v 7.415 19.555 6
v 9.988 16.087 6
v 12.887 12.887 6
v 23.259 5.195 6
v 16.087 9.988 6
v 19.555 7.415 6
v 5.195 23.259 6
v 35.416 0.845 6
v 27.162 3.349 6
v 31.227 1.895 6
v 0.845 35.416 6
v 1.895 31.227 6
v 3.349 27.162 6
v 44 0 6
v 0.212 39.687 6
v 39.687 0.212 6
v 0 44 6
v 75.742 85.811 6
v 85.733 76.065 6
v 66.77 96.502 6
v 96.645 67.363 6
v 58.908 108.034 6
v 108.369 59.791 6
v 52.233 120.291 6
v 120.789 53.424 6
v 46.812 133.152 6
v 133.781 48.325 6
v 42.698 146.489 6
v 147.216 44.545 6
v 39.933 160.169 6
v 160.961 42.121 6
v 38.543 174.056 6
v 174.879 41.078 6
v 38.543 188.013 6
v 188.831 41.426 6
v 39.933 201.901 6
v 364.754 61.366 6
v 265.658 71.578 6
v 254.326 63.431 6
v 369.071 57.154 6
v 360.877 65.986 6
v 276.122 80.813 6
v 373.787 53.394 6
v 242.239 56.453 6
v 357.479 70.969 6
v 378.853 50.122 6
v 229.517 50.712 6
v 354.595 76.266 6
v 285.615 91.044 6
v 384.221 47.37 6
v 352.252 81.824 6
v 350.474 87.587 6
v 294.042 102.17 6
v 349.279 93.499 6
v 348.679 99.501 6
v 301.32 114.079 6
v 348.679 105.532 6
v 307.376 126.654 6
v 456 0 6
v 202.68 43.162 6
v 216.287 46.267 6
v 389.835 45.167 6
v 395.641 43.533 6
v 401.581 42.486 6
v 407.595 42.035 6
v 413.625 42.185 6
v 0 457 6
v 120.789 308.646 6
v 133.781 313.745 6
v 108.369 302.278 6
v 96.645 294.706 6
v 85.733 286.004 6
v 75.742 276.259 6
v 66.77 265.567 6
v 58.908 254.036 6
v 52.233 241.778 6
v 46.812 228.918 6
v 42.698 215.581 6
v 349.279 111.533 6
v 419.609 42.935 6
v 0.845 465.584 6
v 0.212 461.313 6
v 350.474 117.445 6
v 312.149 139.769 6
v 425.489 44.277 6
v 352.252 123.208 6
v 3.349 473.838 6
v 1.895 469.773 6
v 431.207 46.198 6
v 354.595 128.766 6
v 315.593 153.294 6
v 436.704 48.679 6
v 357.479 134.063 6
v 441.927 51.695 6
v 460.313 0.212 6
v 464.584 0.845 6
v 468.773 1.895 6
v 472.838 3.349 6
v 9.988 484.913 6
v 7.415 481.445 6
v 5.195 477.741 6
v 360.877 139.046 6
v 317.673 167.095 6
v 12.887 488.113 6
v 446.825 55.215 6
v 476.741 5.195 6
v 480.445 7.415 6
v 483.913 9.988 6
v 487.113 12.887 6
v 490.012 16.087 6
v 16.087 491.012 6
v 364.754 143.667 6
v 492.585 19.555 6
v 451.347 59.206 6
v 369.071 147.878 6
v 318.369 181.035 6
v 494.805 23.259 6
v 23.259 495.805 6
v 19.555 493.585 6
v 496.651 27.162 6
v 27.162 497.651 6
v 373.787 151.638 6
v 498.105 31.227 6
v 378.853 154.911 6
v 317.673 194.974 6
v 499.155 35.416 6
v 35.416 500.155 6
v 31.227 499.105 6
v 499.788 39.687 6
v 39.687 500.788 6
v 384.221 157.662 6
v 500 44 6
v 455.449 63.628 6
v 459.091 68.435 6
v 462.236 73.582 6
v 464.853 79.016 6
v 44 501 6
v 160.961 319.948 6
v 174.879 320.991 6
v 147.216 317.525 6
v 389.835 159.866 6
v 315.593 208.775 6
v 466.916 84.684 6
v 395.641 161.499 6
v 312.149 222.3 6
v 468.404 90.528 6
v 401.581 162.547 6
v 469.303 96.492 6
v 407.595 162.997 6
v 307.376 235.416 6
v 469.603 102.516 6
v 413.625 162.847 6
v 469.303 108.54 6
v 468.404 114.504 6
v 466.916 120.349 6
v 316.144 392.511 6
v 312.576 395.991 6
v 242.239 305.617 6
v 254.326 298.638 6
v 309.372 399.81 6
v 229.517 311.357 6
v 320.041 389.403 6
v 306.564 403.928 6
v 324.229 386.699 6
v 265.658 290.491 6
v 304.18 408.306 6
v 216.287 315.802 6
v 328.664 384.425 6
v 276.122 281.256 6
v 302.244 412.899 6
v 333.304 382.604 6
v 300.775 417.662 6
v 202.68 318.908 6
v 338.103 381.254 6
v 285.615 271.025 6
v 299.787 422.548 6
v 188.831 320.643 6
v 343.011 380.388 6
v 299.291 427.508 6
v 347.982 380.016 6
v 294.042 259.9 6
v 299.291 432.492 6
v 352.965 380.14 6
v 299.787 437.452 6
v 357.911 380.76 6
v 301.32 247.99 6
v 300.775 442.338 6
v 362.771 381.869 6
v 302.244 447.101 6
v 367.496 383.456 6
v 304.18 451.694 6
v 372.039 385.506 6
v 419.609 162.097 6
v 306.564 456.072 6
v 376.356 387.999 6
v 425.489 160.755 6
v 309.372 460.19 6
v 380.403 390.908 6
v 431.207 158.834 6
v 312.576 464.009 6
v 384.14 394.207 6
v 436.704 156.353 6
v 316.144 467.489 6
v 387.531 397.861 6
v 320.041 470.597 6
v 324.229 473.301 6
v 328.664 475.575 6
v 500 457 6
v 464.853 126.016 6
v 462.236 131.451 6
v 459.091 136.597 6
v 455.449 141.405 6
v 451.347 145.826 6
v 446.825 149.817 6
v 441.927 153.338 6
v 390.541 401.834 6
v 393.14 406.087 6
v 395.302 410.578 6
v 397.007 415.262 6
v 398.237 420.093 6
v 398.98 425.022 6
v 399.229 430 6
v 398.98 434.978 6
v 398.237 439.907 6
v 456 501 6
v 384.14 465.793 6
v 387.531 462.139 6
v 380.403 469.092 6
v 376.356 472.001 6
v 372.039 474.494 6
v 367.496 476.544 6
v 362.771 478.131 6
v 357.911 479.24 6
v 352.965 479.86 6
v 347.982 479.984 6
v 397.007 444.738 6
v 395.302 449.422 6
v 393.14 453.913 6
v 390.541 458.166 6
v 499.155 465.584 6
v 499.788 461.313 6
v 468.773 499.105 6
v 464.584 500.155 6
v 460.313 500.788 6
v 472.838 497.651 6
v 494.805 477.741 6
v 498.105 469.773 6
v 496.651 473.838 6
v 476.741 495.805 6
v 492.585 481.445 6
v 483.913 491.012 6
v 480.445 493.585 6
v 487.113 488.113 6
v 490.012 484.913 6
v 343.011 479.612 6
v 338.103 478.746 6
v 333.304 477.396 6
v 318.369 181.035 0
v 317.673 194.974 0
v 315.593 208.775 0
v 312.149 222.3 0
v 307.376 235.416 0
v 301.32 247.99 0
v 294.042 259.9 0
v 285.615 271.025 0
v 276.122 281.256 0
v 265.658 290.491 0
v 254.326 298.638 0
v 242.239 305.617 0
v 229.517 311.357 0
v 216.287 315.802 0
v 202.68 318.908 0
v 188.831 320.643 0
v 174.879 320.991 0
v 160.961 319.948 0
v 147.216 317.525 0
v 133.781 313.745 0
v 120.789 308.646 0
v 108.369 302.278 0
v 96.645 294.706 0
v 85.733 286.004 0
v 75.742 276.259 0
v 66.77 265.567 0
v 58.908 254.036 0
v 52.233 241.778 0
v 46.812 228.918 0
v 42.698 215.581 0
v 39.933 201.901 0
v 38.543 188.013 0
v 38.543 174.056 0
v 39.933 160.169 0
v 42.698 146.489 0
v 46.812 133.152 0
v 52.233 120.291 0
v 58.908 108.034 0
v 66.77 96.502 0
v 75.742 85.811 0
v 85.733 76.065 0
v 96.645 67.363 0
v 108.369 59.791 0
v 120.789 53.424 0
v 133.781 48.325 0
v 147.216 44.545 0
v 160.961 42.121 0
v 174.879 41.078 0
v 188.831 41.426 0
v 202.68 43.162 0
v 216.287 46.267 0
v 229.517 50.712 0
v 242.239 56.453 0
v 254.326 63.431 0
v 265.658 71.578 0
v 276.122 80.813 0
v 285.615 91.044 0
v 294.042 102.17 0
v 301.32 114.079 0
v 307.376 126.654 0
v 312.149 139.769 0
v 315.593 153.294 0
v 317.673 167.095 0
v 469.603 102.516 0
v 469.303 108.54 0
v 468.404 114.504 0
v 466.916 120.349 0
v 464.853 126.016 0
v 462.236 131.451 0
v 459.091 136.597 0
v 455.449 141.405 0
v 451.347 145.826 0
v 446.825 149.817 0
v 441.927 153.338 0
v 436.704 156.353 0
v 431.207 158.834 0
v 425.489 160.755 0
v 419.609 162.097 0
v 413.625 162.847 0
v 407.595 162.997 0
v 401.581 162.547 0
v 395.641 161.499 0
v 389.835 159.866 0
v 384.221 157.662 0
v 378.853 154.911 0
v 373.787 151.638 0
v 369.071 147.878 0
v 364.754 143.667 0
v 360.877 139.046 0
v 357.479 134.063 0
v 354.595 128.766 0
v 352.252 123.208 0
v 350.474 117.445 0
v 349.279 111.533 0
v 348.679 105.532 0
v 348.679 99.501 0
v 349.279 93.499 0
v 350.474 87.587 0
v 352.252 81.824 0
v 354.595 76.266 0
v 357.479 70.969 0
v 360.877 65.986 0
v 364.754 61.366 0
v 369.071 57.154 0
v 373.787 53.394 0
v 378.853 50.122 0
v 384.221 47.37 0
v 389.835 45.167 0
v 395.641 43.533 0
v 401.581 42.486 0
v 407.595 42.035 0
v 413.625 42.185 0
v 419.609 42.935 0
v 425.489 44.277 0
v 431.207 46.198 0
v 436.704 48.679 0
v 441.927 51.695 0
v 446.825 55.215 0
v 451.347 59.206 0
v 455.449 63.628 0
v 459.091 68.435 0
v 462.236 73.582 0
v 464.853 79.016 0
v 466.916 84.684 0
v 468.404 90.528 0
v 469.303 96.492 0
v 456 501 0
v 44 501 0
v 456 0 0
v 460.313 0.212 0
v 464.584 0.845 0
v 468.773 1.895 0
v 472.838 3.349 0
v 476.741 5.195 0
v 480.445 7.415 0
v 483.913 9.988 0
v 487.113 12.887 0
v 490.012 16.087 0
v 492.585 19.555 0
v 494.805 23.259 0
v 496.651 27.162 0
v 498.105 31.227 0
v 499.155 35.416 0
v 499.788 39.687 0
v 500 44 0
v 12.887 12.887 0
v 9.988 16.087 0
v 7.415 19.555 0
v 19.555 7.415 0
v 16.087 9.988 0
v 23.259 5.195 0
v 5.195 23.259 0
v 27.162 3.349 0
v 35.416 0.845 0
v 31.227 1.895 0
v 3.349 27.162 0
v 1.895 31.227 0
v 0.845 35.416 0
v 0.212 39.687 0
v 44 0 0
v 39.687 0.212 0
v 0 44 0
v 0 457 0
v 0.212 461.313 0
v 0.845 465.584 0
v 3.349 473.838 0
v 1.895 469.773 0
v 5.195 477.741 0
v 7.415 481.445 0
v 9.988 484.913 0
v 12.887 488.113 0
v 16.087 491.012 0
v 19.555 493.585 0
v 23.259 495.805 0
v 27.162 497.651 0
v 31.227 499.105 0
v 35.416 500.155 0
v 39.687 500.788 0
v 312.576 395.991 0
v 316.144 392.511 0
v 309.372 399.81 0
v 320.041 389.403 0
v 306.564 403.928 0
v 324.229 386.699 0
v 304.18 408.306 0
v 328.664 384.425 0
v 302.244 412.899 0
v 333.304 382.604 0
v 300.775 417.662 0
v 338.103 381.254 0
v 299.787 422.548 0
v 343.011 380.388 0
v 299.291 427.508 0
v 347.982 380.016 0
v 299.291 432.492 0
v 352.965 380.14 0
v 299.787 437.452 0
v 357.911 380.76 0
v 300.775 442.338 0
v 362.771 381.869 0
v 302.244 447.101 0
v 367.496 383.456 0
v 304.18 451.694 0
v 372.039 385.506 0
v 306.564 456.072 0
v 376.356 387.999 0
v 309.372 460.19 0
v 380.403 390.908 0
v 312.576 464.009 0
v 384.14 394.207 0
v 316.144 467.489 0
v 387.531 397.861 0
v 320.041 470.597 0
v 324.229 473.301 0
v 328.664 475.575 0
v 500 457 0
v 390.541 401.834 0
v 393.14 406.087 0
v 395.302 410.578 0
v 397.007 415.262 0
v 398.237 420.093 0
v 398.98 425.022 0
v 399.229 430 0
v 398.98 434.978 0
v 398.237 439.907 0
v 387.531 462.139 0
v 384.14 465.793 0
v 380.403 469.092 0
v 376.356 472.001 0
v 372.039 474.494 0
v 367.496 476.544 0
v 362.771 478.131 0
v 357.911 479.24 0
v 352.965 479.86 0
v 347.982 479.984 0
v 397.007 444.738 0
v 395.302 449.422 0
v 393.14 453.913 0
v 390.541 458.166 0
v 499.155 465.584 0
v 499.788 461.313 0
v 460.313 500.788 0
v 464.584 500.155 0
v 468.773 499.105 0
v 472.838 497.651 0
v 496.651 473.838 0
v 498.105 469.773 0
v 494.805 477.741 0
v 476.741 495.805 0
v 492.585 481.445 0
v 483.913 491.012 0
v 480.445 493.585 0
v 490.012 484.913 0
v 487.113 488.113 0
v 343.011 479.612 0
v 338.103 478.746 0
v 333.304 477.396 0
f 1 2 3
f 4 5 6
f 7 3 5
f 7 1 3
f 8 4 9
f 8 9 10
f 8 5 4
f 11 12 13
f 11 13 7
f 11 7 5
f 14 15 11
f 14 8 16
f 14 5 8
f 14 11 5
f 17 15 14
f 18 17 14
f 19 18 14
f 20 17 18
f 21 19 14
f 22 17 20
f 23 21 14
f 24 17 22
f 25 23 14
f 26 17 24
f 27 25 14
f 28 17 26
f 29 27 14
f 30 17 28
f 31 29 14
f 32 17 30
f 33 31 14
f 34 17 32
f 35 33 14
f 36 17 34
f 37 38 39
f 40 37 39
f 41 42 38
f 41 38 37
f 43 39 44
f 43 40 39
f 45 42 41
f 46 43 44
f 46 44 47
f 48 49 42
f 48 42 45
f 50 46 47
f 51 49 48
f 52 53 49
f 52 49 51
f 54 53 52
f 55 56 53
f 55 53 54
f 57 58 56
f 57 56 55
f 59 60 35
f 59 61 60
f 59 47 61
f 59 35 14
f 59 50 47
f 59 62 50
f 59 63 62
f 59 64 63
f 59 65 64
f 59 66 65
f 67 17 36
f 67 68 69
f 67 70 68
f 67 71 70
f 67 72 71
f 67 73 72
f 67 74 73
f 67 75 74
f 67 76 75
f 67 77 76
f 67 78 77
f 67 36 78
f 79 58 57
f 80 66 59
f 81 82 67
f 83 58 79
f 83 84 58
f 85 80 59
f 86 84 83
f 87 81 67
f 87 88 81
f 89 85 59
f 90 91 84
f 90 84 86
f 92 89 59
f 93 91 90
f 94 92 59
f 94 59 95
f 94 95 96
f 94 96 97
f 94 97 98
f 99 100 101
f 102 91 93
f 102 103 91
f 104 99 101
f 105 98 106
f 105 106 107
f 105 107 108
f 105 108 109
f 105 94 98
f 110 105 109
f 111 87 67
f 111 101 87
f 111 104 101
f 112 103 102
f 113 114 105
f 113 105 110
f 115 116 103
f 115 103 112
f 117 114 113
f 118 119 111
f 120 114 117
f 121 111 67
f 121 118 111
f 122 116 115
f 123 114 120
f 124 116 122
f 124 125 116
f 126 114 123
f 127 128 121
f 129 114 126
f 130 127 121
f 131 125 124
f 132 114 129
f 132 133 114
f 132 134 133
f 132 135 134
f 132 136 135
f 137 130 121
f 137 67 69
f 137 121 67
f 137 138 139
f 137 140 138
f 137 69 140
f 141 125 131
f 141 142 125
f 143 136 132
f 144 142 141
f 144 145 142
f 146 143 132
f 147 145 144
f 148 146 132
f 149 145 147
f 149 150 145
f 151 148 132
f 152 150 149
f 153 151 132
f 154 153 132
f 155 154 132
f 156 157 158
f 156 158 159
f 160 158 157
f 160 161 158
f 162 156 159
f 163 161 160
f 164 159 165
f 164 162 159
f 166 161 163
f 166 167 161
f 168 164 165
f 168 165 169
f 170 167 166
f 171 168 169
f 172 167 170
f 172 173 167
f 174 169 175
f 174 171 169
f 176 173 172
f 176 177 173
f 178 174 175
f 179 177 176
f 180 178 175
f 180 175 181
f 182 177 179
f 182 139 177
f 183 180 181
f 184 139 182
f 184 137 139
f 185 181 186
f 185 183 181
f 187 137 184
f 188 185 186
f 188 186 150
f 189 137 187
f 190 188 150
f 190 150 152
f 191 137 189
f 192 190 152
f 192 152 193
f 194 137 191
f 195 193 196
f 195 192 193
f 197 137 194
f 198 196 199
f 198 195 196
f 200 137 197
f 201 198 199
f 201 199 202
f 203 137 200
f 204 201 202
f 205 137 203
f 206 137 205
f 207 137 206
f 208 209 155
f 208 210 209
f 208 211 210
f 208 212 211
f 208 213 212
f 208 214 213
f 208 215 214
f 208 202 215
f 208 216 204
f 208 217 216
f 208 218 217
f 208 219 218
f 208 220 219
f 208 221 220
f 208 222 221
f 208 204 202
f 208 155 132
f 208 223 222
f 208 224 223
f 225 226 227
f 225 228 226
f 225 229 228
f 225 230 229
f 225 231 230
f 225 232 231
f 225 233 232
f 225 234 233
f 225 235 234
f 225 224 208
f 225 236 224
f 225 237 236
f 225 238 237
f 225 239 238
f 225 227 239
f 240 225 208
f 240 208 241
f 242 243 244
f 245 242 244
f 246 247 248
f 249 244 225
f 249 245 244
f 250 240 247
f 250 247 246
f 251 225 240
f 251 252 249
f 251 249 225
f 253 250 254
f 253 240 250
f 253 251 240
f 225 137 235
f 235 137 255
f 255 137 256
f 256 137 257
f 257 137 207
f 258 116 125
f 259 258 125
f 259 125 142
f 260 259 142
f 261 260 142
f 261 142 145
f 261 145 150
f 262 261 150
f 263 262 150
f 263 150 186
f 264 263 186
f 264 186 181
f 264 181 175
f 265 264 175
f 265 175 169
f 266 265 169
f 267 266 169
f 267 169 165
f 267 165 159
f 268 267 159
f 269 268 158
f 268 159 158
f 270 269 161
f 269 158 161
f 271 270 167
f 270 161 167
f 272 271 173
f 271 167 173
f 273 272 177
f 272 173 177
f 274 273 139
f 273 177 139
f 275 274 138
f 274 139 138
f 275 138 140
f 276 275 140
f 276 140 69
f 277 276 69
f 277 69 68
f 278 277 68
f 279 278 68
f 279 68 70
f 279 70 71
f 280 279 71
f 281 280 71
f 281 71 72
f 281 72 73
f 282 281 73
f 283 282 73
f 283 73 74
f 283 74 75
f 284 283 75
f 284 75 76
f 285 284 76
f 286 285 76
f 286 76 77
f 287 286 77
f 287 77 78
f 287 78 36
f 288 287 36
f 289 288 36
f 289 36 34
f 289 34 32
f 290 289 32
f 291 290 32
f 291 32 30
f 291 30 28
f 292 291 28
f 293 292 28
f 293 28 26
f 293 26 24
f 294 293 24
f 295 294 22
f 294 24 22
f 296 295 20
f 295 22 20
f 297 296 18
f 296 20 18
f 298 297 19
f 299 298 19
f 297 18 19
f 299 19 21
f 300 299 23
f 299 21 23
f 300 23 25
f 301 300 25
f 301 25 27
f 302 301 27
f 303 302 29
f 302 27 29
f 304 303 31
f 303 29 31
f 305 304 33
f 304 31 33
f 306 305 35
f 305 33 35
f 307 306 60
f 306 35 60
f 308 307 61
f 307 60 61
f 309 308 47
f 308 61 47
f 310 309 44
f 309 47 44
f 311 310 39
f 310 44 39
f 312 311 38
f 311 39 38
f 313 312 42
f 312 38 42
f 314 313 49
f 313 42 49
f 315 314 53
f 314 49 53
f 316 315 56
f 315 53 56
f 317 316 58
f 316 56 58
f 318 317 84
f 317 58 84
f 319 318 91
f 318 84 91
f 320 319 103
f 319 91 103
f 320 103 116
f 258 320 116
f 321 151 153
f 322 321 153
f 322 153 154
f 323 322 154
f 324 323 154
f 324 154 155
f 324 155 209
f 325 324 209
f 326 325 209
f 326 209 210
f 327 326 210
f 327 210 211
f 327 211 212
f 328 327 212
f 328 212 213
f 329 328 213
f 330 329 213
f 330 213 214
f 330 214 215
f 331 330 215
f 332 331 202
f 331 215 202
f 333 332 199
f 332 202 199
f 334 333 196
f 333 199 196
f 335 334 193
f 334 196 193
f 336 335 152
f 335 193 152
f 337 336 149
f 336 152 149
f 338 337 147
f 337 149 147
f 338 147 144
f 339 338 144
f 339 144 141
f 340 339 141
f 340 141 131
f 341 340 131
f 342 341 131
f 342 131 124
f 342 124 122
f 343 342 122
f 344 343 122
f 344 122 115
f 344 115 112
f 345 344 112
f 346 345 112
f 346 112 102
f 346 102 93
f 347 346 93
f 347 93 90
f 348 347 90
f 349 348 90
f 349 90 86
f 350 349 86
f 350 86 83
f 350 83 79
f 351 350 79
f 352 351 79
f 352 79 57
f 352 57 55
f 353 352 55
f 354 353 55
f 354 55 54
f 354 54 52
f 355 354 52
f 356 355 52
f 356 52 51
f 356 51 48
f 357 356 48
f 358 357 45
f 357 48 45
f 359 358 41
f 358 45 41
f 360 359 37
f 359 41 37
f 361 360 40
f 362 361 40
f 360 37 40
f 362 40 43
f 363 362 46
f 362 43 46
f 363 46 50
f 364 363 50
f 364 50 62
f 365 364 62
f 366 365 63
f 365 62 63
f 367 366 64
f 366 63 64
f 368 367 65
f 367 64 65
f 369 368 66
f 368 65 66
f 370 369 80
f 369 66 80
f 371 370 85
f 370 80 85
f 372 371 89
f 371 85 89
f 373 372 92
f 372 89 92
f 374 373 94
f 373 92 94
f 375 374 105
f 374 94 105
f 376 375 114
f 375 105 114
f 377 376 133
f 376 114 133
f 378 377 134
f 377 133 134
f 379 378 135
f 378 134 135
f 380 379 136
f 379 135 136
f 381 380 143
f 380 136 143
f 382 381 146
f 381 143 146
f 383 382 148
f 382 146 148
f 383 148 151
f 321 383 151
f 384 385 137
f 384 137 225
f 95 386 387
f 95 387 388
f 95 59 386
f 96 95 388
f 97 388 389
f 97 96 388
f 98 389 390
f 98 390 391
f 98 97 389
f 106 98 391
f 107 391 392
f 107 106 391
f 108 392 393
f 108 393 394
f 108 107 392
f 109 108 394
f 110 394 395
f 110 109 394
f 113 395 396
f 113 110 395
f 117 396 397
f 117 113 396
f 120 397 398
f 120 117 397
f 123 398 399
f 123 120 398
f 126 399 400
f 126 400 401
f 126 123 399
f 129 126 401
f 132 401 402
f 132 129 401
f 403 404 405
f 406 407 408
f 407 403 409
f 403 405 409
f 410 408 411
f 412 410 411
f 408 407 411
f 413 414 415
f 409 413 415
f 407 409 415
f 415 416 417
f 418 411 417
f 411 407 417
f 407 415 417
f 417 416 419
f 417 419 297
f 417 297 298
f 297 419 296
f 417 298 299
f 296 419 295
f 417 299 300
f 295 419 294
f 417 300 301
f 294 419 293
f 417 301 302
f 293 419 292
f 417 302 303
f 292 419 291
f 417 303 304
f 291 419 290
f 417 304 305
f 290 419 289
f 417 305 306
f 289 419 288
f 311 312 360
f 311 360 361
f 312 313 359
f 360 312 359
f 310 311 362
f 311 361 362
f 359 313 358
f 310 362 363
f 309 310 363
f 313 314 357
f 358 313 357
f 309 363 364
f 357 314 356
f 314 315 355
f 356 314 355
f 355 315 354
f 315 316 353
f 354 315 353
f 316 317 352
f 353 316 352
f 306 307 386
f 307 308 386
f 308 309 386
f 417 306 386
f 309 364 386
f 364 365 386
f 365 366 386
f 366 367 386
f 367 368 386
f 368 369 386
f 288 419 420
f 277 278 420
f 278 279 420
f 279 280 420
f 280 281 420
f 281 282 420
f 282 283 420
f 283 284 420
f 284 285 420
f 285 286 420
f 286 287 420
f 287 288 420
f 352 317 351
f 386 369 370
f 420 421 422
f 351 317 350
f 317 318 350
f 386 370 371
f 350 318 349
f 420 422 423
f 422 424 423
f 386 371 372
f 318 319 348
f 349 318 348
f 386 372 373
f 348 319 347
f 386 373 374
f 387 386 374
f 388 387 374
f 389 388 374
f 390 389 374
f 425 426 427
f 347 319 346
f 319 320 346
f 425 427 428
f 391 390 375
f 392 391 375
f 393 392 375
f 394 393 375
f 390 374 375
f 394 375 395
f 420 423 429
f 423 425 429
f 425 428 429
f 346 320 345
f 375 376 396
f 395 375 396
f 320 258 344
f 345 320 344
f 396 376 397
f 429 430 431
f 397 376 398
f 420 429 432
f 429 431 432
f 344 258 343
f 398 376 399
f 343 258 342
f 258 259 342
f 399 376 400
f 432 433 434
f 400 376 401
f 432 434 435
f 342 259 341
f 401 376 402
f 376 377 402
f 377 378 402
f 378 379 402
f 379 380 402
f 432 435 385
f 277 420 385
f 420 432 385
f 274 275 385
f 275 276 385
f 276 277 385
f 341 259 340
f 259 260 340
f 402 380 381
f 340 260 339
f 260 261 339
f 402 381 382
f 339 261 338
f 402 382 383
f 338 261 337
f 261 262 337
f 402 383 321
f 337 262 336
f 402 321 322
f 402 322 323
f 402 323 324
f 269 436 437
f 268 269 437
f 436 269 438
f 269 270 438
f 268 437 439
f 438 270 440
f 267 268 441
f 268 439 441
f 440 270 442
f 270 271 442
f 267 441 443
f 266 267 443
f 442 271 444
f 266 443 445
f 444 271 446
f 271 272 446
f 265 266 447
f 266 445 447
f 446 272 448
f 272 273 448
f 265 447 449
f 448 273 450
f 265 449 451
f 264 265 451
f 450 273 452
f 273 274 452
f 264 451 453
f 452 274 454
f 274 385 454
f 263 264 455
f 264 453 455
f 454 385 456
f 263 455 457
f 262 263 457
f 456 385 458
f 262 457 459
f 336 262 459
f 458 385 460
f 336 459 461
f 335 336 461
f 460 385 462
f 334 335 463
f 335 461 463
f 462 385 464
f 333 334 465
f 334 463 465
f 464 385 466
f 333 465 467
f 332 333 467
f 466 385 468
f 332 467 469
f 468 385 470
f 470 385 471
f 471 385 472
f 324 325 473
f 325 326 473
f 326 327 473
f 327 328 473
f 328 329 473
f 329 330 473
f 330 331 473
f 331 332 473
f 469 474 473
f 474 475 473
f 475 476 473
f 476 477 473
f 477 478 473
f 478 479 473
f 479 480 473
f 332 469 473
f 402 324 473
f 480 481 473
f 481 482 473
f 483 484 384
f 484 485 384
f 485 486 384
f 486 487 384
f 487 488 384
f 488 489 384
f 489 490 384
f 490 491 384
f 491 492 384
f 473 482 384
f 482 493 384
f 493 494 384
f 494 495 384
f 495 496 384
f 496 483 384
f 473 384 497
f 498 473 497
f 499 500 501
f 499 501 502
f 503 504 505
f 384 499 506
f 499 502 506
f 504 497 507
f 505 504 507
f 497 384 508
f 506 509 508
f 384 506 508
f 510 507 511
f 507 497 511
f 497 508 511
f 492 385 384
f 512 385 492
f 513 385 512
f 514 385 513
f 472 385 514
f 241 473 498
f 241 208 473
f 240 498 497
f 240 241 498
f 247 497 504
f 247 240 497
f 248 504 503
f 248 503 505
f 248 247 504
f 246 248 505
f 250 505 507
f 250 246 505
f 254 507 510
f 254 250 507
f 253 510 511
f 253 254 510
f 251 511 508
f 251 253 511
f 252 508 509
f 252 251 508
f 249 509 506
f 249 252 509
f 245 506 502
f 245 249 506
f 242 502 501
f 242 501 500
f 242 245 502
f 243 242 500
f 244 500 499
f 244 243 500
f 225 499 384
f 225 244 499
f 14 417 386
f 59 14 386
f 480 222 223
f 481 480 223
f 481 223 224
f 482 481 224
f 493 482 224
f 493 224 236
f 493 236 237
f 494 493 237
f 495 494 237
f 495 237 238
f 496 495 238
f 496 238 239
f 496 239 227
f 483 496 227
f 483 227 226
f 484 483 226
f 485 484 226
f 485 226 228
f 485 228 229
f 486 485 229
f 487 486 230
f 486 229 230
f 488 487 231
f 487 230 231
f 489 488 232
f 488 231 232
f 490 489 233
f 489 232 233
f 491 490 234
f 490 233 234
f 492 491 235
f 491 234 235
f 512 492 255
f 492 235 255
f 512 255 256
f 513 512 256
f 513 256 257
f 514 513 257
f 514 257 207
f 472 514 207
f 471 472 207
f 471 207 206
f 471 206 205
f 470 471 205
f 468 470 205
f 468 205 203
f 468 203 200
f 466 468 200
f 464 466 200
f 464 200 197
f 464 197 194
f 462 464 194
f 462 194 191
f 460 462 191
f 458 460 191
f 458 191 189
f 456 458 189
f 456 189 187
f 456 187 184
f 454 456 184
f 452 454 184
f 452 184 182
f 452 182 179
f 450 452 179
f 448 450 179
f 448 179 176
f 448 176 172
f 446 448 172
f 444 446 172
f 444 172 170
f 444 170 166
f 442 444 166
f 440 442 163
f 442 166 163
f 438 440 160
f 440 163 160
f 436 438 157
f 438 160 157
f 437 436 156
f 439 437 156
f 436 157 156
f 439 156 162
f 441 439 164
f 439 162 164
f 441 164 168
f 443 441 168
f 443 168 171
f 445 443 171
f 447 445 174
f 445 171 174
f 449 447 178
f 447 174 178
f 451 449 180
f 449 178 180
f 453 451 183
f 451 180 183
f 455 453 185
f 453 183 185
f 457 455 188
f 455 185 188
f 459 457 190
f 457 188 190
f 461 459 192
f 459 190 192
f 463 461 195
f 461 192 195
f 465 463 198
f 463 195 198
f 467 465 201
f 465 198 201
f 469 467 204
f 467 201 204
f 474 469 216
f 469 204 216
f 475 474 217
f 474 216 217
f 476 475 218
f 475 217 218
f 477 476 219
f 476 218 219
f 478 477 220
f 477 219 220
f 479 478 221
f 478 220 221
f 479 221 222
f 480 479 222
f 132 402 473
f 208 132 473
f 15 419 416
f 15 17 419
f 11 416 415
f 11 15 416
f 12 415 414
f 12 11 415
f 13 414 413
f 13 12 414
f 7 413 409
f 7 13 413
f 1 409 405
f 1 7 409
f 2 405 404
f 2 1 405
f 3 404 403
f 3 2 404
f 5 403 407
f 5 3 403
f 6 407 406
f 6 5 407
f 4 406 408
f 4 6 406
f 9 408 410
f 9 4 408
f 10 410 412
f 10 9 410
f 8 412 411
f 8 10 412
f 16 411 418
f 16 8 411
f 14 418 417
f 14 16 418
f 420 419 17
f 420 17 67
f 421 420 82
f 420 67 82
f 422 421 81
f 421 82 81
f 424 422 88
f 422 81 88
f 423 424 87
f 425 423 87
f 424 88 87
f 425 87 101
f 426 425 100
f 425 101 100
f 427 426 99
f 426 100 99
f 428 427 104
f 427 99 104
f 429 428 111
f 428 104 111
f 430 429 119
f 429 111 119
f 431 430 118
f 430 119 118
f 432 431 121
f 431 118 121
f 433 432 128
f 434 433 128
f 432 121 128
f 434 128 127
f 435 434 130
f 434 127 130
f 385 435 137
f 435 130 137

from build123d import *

# Parameters (mm, degrees)
SKETCH1_W           = 500
SKETCH1_H           = 501
BOSS_EXTRUDE1_DEPTH = 6
FILLET1_R           = 44
SKETCH3_R           = 140
CUT_EXTRUDE2_DEPTH  = 7
SKETCH5_R           = 60.5
CUT_EXTRUDE3_DEPTH  = 7
SKETCH6_R           = 50
CUT_EXTRUDE5_DEPTH  = 7


with BuildPart() as part:
    # Sketch1 → Boss-Extrude1 (new body)
    with BuildSketch(Plane.XY):
        with Locations((250, 250.5)):
            Rectangle(SKETCH1_W, SKETCH1_H)
    extrude(amount=BOSS_EXTRUDE1_DEPTH)

    # Fillet1
    fillet1_edges = [part.edges().sort_by_distance(p)[0] for p in [
        (0, 501, 3),
        (500, 501, 3),
        (500, 0, 3),
        (0, 0, 3),
    ]]
    fillet(fillet1_edges, radius=FILLET1_R)

    # Sketch3 → Cut-Extrude2 (cut, through all)
    with BuildSketch(Plane.XY.offset(6)):
        with Locations((178.369044072, 181.034738009)):
            Circle(SKETCH3_R)
    extrude(amount=-CUT_EXTRUDE2_DEPTH, mode=Mode.SUBTRACT)

    # Sketch5 → Cut-Extrude3 (cut, through all)
    with BuildSketch(Plane.XY.offset(6)):
        with Locations((409.103373264, 102.516190165)):
            Circle(SKETCH5_R)
    extrude(amount=-CUT_EXTRUDE3_DEPTH, mode=Mode.SUBTRACT)

    # Sketch6 → Cut-Extrude5 (cut, through all)
    with BuildSketch(Plane.XY.offset(6)):
        with Locations((349.228645131, 430)):
            Circle(SKETCH6_R)
    extrude(amount=-CUT_EXTRUDE5_DEPTH, mode=Mode.SUBTRACT)


solid = part.part
